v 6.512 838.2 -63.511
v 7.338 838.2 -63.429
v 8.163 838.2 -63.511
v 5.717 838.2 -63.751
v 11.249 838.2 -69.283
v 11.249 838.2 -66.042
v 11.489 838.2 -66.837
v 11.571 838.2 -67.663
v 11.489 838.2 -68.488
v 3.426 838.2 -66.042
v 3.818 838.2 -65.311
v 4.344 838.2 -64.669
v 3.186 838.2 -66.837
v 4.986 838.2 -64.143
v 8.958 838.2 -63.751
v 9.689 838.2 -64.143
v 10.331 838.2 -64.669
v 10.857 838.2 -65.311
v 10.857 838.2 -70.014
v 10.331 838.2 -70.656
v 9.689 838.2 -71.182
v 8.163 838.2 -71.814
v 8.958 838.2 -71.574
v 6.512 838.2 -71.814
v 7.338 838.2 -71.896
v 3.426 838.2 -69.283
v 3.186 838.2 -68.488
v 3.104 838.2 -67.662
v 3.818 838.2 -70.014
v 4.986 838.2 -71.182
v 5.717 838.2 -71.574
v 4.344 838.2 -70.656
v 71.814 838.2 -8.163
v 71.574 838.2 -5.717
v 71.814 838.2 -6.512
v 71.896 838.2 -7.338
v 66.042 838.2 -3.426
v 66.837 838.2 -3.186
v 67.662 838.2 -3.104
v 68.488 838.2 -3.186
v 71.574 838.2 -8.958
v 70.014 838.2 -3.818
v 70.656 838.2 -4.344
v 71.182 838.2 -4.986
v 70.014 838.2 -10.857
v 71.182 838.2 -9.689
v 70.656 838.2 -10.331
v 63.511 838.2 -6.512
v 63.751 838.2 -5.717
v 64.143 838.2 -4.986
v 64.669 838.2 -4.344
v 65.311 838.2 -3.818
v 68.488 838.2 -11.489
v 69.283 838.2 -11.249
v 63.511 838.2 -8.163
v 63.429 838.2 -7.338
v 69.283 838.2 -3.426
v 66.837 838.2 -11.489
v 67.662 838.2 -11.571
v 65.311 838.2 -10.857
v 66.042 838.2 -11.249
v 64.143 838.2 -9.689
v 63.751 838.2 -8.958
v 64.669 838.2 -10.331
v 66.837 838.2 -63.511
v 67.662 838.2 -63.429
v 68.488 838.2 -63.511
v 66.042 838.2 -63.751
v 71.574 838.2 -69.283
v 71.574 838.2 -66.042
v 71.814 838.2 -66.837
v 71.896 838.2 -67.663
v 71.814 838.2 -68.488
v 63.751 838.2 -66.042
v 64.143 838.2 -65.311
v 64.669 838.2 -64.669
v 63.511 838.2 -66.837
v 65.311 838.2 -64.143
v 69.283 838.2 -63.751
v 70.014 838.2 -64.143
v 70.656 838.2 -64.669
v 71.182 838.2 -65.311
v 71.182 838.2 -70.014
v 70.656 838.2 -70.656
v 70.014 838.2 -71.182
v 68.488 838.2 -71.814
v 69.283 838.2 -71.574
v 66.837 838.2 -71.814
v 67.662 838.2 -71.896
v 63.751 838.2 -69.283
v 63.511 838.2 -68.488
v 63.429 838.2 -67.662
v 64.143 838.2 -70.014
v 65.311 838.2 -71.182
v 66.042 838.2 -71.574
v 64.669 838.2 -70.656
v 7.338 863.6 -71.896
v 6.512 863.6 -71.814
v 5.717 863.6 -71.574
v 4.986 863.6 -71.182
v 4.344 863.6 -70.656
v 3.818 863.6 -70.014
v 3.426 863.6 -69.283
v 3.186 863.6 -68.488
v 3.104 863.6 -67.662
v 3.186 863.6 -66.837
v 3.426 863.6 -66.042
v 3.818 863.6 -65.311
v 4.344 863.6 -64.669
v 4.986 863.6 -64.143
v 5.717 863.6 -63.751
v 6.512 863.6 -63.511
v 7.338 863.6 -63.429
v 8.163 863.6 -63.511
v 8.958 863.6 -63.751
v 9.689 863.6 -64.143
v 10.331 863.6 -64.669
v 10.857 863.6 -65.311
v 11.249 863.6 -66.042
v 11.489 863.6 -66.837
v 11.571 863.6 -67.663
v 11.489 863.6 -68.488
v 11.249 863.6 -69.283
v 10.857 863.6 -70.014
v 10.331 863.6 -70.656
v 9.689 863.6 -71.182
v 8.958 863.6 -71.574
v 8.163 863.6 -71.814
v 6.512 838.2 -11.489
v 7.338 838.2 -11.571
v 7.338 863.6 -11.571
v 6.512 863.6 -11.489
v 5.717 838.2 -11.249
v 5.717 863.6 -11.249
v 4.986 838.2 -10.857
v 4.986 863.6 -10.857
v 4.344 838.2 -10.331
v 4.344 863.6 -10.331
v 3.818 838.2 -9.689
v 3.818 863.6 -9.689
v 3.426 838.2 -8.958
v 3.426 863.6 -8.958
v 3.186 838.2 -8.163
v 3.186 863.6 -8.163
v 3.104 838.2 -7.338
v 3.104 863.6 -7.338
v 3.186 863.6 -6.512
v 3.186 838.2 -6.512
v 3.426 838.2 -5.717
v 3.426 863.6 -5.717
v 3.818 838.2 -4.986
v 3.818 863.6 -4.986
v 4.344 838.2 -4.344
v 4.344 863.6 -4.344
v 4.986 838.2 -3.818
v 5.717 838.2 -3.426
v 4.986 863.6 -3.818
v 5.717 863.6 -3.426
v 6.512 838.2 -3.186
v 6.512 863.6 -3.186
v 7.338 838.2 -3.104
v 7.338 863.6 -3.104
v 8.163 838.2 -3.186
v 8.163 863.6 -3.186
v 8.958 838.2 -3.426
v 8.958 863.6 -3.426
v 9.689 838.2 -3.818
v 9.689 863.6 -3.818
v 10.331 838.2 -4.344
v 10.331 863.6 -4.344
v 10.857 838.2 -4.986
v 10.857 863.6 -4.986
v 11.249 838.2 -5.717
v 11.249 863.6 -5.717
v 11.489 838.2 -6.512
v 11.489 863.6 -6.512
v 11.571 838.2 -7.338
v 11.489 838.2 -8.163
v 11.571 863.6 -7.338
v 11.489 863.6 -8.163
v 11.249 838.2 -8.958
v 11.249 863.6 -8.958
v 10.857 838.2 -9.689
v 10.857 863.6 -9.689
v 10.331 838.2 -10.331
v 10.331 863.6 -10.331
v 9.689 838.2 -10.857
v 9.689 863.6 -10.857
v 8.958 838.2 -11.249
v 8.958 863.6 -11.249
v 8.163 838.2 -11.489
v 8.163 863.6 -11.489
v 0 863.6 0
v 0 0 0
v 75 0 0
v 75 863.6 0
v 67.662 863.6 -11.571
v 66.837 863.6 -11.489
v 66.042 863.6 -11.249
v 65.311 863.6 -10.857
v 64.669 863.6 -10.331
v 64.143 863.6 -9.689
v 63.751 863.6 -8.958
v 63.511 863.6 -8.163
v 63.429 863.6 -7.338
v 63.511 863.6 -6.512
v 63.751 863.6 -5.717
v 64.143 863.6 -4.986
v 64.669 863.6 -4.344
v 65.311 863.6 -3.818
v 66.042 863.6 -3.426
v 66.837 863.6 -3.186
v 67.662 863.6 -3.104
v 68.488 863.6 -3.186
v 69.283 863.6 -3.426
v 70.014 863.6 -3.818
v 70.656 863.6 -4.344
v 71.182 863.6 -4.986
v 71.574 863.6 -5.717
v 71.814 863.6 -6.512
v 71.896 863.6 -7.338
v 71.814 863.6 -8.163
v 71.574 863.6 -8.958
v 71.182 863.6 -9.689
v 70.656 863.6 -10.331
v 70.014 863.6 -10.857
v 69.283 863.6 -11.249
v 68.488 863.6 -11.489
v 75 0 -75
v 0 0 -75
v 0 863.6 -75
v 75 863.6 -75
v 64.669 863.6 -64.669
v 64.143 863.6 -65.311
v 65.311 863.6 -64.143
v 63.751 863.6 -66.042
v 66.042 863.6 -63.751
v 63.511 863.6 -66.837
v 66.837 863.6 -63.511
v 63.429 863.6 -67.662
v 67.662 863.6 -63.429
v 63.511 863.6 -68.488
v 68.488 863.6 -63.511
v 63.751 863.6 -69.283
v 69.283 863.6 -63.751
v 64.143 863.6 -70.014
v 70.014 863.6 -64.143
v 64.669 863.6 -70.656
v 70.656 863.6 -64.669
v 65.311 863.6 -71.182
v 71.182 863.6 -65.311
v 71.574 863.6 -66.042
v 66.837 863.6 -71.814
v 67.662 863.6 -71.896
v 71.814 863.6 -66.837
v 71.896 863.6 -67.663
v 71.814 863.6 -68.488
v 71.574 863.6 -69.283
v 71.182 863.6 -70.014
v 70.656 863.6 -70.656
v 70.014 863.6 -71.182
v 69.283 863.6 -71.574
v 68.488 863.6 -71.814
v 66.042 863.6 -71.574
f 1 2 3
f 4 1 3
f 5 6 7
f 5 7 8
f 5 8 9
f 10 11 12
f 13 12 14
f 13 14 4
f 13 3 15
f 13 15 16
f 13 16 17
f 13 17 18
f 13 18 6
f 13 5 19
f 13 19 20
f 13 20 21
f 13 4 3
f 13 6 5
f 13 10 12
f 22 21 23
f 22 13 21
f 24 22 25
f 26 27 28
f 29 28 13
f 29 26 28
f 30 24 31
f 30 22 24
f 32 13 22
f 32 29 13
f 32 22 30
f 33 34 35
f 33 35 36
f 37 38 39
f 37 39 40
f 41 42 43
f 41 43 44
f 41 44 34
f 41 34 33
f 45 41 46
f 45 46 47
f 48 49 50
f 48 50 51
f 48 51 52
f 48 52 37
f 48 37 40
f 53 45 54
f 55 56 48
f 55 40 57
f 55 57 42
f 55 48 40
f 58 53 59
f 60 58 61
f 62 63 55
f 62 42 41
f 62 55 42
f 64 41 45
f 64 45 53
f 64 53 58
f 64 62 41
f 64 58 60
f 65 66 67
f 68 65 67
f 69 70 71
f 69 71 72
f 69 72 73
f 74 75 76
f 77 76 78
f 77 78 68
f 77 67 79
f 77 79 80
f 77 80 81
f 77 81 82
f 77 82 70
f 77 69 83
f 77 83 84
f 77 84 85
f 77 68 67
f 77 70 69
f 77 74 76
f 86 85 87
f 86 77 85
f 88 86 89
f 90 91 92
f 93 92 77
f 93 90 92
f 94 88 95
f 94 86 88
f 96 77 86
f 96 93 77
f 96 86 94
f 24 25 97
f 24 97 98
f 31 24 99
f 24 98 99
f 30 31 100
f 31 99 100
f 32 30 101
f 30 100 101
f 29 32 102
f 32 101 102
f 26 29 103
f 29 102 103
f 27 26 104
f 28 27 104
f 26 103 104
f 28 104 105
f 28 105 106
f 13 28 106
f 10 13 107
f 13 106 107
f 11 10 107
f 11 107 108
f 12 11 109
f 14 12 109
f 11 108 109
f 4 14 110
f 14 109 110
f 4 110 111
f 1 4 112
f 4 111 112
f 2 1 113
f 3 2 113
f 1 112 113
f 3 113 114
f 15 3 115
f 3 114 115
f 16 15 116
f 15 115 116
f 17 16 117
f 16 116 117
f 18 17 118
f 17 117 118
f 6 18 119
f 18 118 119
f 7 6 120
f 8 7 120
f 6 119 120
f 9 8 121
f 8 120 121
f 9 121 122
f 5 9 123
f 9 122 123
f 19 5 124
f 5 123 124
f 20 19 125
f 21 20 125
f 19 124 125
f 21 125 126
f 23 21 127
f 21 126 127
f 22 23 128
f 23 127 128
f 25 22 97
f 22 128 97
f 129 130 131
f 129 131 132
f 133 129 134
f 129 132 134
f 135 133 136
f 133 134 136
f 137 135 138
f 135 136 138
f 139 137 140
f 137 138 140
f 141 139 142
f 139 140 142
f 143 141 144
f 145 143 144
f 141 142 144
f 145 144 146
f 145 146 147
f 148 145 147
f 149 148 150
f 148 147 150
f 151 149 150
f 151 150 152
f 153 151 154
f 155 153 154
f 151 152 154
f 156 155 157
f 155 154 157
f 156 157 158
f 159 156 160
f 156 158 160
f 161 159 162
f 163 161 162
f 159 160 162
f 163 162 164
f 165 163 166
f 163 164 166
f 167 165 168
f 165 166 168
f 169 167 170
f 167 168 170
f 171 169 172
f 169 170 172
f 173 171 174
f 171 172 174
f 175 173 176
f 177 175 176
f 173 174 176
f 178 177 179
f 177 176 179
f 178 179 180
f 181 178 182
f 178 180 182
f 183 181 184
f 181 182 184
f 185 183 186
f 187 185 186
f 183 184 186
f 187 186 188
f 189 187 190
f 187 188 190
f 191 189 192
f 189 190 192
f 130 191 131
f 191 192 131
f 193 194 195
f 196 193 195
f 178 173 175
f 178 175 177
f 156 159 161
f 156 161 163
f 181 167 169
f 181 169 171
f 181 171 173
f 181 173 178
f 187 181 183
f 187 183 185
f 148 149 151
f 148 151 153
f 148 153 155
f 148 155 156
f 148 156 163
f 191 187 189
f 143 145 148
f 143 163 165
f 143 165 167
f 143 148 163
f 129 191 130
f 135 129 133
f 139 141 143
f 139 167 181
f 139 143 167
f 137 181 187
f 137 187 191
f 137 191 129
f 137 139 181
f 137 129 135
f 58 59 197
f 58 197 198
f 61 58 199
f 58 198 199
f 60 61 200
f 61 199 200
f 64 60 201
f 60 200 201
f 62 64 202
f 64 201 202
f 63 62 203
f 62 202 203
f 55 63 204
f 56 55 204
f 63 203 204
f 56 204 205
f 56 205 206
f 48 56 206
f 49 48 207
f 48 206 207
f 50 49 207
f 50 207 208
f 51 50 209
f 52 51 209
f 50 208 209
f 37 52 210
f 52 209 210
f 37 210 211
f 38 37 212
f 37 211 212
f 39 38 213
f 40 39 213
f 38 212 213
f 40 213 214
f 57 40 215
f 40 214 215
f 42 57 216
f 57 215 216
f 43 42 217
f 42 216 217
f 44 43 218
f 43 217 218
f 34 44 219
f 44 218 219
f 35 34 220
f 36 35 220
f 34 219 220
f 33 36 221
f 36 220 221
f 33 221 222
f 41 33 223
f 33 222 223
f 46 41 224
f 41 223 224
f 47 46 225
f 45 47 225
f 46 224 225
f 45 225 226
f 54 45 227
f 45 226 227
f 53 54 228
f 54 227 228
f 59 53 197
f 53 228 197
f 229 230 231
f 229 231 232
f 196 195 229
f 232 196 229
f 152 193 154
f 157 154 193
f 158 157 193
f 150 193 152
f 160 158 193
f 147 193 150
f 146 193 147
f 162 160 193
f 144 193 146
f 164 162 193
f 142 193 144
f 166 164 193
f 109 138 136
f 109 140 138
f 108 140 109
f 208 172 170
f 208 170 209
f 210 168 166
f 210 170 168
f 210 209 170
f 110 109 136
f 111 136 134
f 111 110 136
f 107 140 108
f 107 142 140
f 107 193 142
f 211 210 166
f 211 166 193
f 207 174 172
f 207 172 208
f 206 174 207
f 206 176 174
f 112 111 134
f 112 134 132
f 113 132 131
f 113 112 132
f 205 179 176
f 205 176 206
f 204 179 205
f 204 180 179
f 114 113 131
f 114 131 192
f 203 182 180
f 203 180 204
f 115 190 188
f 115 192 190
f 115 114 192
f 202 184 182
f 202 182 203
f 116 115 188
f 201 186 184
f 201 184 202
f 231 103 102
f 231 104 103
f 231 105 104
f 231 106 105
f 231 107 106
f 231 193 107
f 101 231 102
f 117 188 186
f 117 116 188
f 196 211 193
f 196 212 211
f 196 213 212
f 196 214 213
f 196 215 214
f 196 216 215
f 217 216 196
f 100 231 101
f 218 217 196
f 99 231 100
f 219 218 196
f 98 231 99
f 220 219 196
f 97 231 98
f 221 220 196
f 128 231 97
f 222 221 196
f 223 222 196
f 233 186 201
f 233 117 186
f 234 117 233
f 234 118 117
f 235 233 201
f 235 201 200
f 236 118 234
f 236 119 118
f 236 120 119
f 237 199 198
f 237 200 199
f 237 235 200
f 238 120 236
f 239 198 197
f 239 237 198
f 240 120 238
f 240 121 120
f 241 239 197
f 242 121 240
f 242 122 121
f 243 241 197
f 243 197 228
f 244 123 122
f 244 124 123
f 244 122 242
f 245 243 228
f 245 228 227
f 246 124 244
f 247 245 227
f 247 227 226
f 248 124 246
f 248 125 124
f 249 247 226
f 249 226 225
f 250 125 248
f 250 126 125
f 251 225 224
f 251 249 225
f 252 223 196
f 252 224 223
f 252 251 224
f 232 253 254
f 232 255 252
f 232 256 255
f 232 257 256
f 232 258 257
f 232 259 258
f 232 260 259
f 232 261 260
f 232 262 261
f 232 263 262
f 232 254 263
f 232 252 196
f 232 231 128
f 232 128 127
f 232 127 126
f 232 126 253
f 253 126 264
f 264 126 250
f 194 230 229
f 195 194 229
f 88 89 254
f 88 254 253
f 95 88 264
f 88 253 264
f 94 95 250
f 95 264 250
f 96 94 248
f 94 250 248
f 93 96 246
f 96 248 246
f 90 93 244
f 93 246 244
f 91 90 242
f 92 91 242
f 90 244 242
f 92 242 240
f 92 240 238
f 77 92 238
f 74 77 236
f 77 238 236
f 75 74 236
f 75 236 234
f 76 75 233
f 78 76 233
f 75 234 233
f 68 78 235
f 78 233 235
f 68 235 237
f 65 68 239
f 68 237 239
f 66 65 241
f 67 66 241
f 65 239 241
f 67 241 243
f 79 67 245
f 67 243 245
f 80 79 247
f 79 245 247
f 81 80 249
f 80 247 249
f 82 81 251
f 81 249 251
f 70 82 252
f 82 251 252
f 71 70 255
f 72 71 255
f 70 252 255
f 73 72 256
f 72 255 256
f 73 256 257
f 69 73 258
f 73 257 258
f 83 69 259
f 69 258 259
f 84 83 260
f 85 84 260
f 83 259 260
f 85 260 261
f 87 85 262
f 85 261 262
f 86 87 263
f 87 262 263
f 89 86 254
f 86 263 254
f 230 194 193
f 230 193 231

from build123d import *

# Parameters (mm, degrees)
SKETCH3_W           = 75
SKETCH3_H           = 75
BOSS_EXTRUDE1_DEPTH = 863.6
CUT_EXTRUDE1_START  = 863.6
SKETCH4_R           = 4.233291
CUT_EXTRUDE1_DEPTH  = 25.4


with BuildPart() as part:
    # Sketch3 → Boss-Extrude1 (new body)
    with BuildSketch(Plane(origin=(0, 0, 0), x_dir=(1, 0, 0), z_dir=(0, 1, 0))):
        with Locations((37.5, 37.5)):
            Rectangle(SKETCH3_W, SKETCH3_H)
    extrude(amount=BOSS_EXTRUDE1_DEPTH)

    # Sketch4 → Cut-Extrude1 (cut)
    with BuildSketch(Plane(origin=(0, 0, 0), x_dir=(1, 0, 0), z_dir=(0, 1, 0)).offset(CUT_EXTRUDE1_START)):
        with Locations(Location((7.3375, 67.6625, 0), (0, 0, 90))):
            Circle(SKETCH4_R)
        with Locations(Location((67.6625, 67.6625, 0), (0, 0, 90))):
            Circle(SKETCH4_R)
        with Locations(Location((7.3375, 7.3375, 0), (0, 0, 90))):
            Circle(SKETCH4_R)
        with Locations(Location((67.6625, 7.3375, 0), (0, 0, 90))):
            Circle(SKETCH4_R)
    extrude(amount=-CUT_EXTRUDE1_DEPTH, mode=Mode.SUBTRACT)


solid = part.part
